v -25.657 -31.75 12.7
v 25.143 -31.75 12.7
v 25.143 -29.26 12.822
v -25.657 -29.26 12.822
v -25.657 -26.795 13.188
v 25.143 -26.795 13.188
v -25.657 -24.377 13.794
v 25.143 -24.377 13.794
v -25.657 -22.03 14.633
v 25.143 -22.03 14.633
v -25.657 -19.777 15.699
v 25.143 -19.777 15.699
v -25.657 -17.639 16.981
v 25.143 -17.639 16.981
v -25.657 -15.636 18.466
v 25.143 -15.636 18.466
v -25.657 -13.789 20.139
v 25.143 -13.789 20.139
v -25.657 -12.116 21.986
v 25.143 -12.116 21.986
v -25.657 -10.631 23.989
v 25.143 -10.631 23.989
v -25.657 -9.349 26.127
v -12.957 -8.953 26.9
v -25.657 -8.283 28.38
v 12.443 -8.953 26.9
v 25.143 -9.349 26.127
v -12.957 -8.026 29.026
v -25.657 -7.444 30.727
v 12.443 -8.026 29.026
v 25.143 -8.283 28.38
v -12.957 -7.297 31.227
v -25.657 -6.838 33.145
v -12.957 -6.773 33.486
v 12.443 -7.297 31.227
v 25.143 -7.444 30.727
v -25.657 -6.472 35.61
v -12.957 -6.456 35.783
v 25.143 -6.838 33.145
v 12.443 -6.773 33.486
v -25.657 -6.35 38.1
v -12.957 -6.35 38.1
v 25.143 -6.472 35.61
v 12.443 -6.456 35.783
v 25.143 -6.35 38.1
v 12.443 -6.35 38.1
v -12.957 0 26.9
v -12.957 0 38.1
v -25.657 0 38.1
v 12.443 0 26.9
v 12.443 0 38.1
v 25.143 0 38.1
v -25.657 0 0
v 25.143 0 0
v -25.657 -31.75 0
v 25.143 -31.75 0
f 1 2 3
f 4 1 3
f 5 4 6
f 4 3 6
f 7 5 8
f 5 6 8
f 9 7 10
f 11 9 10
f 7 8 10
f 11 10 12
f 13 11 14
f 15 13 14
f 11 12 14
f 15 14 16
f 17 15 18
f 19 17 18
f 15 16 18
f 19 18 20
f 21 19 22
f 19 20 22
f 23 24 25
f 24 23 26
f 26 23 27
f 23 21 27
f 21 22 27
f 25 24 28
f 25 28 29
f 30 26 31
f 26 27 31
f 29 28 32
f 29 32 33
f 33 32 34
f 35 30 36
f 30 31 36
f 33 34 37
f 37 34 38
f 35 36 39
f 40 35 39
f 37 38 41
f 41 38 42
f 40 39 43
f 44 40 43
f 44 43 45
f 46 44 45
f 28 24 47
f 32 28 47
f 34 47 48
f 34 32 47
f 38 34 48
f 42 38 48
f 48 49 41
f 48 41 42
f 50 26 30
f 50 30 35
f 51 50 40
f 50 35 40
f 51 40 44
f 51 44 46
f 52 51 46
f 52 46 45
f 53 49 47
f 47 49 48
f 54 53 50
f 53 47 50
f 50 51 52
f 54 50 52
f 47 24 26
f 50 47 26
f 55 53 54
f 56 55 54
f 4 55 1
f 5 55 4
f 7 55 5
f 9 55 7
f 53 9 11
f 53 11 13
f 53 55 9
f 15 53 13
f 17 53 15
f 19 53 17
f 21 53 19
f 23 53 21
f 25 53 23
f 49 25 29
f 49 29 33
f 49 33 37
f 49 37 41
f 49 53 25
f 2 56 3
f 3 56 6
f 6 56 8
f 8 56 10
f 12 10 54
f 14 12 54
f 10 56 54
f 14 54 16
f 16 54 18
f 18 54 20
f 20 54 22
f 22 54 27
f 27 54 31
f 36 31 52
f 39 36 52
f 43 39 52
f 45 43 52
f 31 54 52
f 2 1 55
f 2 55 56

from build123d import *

# Parameters (mm, degrees)
F0_W     = 50.8
F0_H     = 38.1
F1_DEPTH = 31.75
F3_DEPTH = 50.801
F4_W     = 25.4
F4_H     = 11.23293
F5_DEPTH = 31.751


with BuildPart() as f1:
    # F0 (on Front) → F1 (new body)
    with BuildSketch(Plane.XZ):
        with Locations((-0.257215, 19.05)):
            Rectangle(F0_W, F0_H)
    extrude(amount=F1_DEPTH)

    # F2 (on face) → F3 (cut, through all)
    with BuildSketch(Plane.YZ.offset(25.142785)):
        with BuildLine():
            ThreePointArc((-31.75, 12.7), (-13.789488, 20.139488), (-6.35, 38.1))
            Line((-6.35, 38.1), (-31.75, 38.1))
            Line((-31.75, 38.1), (-31.75, 12.7))
        make_face()
    extrude(amount=-F3_DEPTH, mode=Mode.SUBTRACT)

    # F4 (on face) → F5 (cut, through all)
    with BuildSketch(Plane.XZ.offset(31.75)):
        with Locations((-0.257215, 32.516378)):
            Rectangle(F4_W, F4_H)
    extrude(amount=-F5_DEPTH, mode=Mode.SUBTRACT)


solid = f1.part
